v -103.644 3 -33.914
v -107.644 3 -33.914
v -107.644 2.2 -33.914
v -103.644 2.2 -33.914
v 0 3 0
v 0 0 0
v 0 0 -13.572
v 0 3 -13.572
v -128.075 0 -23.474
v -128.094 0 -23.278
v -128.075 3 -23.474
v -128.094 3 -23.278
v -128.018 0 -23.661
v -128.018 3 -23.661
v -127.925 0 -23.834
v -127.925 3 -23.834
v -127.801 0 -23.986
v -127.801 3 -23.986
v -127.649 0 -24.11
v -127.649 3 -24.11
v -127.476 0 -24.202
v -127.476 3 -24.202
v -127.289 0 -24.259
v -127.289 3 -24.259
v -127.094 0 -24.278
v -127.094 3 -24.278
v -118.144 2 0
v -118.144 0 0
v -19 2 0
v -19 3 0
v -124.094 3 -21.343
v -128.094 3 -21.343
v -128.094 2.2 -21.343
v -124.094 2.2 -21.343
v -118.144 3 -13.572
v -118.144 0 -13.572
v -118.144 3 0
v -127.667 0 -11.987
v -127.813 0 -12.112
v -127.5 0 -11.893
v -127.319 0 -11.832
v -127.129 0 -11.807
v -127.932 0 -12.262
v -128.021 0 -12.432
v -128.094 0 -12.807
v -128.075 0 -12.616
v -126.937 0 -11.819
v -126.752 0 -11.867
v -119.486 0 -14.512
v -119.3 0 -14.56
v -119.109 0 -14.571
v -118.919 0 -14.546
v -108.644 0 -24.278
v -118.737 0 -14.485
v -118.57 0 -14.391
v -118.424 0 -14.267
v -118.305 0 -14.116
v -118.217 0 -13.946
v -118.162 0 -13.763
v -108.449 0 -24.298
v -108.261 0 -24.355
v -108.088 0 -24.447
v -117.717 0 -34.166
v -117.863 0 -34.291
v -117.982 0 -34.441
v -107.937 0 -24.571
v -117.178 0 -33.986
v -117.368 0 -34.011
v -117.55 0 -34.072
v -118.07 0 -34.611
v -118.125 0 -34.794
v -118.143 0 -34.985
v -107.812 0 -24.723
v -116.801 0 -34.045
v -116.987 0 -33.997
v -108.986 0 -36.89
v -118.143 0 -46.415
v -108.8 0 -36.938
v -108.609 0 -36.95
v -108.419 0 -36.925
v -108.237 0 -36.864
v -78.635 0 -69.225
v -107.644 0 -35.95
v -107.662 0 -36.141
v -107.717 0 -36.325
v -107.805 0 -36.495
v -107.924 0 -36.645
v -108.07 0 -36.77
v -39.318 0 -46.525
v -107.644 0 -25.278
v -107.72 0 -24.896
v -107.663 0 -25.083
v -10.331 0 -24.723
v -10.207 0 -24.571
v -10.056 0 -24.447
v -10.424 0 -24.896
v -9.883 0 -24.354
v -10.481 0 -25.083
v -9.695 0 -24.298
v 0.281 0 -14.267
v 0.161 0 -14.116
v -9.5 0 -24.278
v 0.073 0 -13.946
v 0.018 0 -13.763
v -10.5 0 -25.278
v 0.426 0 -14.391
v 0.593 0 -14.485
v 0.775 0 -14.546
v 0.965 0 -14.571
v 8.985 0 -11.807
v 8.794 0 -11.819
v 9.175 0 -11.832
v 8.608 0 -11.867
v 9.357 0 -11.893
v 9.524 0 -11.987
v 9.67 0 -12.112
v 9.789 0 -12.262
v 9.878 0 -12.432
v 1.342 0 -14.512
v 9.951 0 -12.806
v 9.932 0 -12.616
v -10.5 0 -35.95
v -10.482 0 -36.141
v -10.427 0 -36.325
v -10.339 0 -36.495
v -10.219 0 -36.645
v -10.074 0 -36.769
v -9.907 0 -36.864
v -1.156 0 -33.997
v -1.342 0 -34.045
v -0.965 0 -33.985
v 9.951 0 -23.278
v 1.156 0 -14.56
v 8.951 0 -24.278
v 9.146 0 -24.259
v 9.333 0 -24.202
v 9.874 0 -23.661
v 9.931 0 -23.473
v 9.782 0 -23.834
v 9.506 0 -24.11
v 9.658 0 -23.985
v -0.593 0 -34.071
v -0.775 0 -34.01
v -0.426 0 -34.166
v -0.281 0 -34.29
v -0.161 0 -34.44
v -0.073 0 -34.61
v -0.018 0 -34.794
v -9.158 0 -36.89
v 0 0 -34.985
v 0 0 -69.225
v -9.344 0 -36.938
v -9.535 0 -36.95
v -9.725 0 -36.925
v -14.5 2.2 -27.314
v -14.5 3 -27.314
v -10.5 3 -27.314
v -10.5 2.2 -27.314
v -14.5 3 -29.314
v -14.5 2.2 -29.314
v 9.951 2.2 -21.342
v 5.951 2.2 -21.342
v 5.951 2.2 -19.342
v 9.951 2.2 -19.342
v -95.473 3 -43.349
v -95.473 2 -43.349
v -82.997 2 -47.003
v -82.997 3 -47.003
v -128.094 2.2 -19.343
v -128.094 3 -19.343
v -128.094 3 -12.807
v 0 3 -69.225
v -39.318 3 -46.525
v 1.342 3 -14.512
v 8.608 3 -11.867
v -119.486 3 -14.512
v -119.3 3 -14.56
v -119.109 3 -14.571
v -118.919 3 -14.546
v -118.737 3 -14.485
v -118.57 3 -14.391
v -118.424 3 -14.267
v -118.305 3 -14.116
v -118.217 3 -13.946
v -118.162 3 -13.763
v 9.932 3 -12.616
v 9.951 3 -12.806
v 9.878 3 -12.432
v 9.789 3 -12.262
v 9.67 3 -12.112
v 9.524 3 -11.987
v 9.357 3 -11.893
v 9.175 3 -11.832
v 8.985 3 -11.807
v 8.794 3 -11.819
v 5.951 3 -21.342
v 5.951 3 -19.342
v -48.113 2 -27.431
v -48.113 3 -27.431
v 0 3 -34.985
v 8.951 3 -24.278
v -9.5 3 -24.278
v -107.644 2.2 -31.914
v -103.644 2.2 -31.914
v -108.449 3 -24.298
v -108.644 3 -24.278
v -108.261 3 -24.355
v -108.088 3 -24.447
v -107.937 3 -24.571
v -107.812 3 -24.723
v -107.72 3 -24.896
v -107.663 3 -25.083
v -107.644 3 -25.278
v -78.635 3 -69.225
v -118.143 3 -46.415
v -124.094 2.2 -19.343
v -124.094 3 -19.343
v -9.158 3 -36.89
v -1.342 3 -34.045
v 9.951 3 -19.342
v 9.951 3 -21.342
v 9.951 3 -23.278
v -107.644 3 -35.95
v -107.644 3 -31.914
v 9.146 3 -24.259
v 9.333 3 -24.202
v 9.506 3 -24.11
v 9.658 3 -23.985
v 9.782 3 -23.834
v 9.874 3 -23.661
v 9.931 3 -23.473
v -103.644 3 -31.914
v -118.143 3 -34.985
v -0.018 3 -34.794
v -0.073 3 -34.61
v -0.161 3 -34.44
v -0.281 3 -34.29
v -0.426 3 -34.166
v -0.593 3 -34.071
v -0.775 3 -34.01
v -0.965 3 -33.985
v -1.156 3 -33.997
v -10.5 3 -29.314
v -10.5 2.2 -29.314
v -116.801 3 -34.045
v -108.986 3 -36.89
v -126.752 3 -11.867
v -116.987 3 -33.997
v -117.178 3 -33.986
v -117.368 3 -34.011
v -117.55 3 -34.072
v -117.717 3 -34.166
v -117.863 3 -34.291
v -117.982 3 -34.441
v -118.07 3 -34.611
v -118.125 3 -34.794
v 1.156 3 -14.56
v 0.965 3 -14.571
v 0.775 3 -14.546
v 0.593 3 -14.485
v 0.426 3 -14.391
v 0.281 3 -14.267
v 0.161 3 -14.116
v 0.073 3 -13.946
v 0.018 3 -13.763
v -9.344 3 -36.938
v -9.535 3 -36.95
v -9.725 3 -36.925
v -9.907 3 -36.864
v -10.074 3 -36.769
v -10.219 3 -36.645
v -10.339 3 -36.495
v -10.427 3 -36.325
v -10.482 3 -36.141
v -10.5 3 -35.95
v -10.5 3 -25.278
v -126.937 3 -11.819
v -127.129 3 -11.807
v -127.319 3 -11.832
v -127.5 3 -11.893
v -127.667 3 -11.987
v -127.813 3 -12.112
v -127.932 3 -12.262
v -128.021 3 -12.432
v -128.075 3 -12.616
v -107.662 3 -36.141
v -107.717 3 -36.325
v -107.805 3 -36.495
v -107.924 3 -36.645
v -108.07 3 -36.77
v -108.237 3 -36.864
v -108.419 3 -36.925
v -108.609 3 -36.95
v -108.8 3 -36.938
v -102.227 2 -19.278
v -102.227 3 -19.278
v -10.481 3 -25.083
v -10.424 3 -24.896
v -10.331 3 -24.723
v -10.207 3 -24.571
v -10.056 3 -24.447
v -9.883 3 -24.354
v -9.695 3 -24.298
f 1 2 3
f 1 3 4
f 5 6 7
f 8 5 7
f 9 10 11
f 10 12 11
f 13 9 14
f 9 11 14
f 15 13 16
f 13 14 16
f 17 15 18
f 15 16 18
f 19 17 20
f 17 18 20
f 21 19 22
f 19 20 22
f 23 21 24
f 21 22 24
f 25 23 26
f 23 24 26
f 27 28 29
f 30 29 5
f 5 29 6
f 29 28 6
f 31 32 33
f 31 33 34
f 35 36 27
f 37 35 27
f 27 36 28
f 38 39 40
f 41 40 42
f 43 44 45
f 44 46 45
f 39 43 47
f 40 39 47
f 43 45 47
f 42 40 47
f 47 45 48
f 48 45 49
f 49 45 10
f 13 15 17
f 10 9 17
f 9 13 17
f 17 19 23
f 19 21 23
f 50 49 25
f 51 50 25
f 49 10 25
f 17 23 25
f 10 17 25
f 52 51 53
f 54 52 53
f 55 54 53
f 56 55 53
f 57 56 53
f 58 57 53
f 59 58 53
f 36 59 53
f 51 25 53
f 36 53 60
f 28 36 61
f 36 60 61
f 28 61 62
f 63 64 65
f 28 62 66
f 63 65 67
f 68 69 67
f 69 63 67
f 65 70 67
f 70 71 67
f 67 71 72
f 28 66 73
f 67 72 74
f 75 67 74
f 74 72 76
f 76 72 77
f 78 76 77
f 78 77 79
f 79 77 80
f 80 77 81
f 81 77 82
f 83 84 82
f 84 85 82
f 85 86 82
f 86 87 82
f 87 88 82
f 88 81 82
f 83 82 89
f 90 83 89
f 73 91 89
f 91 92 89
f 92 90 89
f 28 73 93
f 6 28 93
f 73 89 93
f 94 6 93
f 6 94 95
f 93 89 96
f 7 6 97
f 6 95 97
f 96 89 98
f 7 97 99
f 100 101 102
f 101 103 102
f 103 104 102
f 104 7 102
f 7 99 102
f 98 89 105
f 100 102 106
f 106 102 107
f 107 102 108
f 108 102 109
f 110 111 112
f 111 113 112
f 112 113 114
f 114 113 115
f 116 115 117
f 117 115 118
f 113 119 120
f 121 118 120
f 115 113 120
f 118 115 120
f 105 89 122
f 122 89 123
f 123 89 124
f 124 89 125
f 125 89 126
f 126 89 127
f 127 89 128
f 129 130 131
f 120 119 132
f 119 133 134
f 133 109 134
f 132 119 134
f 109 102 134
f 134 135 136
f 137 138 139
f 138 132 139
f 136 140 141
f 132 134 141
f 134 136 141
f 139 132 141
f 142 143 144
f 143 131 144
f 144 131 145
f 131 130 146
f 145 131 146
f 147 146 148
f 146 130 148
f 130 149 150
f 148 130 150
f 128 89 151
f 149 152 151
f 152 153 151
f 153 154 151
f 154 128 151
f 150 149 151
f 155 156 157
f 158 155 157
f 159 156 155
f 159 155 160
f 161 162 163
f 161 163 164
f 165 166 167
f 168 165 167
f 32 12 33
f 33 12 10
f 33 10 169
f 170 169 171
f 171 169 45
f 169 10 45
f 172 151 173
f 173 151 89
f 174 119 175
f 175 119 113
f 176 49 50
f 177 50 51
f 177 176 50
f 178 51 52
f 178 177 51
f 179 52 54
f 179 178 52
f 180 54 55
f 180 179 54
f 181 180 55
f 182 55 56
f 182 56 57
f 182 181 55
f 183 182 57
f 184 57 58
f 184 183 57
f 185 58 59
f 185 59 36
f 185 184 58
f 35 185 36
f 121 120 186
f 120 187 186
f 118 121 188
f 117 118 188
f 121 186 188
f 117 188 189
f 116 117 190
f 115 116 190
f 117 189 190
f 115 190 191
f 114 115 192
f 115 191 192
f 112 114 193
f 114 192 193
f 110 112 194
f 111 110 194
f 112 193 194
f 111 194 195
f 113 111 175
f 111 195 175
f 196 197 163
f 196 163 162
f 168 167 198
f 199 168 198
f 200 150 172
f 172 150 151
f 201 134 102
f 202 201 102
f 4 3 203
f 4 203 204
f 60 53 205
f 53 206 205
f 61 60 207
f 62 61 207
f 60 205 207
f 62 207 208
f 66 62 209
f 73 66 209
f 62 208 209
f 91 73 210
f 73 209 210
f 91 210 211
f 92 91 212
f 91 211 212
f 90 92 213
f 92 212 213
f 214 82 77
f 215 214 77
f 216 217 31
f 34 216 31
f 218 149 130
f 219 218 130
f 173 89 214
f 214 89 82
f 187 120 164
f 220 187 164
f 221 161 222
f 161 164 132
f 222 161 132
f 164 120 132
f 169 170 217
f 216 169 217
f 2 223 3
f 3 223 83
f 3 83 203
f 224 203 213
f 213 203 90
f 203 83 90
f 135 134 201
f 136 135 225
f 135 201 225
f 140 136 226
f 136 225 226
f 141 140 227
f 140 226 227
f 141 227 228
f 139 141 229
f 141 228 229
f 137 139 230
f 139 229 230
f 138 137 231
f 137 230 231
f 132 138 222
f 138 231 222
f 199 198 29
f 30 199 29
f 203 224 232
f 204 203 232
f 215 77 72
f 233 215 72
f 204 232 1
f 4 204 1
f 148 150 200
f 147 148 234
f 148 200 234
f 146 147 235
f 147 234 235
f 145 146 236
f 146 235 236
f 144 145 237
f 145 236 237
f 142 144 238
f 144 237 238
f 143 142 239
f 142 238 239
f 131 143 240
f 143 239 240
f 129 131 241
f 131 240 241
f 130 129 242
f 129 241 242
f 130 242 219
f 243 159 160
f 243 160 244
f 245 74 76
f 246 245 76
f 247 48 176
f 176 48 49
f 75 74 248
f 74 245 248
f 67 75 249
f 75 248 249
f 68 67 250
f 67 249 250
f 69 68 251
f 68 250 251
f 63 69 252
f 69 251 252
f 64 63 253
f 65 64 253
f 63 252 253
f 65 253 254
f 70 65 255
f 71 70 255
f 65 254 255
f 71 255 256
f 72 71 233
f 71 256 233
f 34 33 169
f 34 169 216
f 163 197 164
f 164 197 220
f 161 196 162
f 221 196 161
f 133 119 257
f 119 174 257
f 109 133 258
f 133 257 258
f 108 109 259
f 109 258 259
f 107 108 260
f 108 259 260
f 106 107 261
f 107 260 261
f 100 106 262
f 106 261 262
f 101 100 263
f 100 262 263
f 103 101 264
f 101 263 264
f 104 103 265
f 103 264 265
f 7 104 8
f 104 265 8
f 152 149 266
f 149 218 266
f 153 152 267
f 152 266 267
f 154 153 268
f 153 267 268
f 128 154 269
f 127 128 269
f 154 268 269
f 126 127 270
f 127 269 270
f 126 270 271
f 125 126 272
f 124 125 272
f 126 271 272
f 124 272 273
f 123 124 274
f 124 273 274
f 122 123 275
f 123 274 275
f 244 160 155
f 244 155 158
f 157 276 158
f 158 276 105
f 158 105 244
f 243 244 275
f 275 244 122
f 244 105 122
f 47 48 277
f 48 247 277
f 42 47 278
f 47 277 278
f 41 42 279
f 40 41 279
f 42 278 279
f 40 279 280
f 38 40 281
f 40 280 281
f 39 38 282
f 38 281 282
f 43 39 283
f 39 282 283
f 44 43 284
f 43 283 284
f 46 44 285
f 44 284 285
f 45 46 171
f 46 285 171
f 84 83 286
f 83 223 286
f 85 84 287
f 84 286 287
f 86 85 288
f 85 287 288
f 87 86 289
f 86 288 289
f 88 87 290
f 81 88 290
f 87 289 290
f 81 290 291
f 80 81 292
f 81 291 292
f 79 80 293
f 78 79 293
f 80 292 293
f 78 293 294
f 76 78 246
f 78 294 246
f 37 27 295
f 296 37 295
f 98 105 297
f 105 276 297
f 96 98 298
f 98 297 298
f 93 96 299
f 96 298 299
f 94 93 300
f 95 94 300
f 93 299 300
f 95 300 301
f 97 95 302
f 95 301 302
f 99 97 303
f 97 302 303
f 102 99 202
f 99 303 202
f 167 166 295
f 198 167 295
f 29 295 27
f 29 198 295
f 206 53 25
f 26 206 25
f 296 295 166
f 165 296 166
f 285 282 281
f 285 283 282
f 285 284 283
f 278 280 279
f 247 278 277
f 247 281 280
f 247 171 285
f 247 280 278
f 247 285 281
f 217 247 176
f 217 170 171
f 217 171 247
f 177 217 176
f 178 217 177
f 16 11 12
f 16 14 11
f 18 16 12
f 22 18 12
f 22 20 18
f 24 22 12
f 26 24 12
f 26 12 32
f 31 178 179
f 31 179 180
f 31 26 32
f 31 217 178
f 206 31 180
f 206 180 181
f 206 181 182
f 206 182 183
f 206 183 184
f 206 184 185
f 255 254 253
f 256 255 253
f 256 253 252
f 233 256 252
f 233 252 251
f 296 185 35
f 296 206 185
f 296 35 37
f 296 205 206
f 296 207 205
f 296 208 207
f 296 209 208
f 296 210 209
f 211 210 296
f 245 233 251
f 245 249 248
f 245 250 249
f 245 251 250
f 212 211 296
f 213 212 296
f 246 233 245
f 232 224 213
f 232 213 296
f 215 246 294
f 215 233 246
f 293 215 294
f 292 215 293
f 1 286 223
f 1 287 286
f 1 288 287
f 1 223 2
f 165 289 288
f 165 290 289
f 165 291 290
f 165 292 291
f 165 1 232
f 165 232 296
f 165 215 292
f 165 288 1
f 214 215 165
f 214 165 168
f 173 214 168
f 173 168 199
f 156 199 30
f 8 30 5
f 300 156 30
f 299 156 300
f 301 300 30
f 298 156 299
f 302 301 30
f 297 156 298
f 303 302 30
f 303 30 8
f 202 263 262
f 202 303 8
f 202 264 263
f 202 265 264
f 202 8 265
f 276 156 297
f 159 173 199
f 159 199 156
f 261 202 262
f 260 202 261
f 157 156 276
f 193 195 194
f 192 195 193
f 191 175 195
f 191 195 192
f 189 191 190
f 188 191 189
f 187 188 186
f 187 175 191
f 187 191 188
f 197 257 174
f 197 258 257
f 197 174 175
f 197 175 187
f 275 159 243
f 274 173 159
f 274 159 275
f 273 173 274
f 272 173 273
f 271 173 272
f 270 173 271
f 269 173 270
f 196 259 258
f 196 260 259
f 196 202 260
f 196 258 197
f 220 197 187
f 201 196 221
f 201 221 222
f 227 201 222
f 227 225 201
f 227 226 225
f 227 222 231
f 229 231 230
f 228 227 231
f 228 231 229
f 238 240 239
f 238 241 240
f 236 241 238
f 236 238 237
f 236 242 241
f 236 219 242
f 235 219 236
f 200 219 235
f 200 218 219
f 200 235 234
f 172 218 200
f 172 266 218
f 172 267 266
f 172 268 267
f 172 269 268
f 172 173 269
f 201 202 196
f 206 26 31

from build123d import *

# Parameters (mm, degrees)
P_IDAT_VYSUNUT_M1_DEPTH  = 3
P_IDAT_VYSUNUT_M2_DEPTH  = 2
ZAOBLIT3_R               = 1
SKICA2_W                 = 4
SKICA2_H                 = 2
ODEBRAT_VYSUNUT_M1_DEPTH = 0.8
SKICA3_W                 = 4
SKICA3_H                 = 2
ODEBRAT_VYSUNUT_M2_DEPTH = 0.8


with BuildPart() as part:
    # Skica1 → P_idat vysunut_m1 (new body)
    with BuildSketch(Plane(origin=(0, 0, 0), x_dir=(1, 0, 0), z_dir=(0, 1, 0))):
        Polygon((-118.143750166, 15), (-118.143750166, 0), (-102.227105248, 19.278496169), (-95.473037065, 43.348863075), (-82.997228437, 47.003202833), (-48.112980408, 27.430537213), (-19, 0), (0, 0), (0, 15), (9.950504516, 11.37831254), (9.950504516, 24.27831254), (-10.5, 24.27831254), (-10.5, 37.37831254), (0, 33.55662508), (0, 69.224902673), (-39.317553332, 46.524902673), (-78.635106664, 69.224902673), (-118.143185584, 46.414902673), (-118.143185584, 33.5570142), (-107.643750166, 37.378496169), (-107.643750166, 24.278496169), (-128.093750166, 24.278496169), (-128.093750166, 11.378496169), align=None)
    extrude(amount=P_IDAT_VYSUNUT_M1_DEPTH)

    # Skica1_3 → P_idat vysunut_m2 (add)
    with BuildSketch(Plane(origin=(0, 0, 0), x_dir=(1, 0, 0), z_dir=(0, 1, 0))):
        Polygon((-102.227105248, 19.278496169), (-118.143750166, 0), (-19, 0), (-48.112980408, 27.430537213), (-82.997228437, 47.003202833), (-95.473037065, 43.348863075), align=None)
    extrude(amount=P_IDAT_VYSUNUT_M2_DEPTH)

    # Zaoblit3
    zaoblit3_edges = [part.edges().sort_by_distance(p)[0] for p in [
        (-10.5, 1.5, -24.27831254),
        (9.950504516, 1.5, -24.27831254),
        (9.950504516, 1.5, -11.37831254),
        (0, 1.5, -15),
        (-118.143750166, 1.5, -15),
        (-128.093750166, 1.5, -11.378496169),
        (-128.093750166, 1.5, -24.278496169),
        (-107.643750166, 1.5, -24.278496169),
        (-107.643750166, 1.5, -37.378496169),
        (-118.143185584, 1.5, -33.5570142),
        (0, 1.5, -33.55662508),
        (-10.5, 1.5, -37.37831254),
    ]]
    fillet(zaoblit3_edges, radius=ZAOBLIT3_R)

    # Skica2 → Odebrat vysunut_m1 (cut)
    with BuildSketch(Plane(origin=(0, 3, 0), x_dir=(1, 0, 0), z_dir=(0, 1, 0))):
        with Locations((-105.643750166, 32.914422166)):
            Rectangle(SKICA2_W, SKICA2_H)
        with Locations((-126.093750166, 20.342570172)):
            Rectangle(SKICA2_W, SKICA2_H)
    extrude(amount=-ODEBRAT_VYSUNUT_M1_DEPTH, mode=Mode.SUBTRACT)

    # Skica3 → Odebrat vysunut_m2 (cut)
    with BuildSketch(Plane(origin=(0, 3, 0), x_dir=(1, 0, 0), z_dir=(0, 1, 0))):
        with Locations((-12.5, 28.314238537)):
            Rectangle(SKICA3_W, SKICA3_H)
        with Locations((7.950504516, 20.342386544)):
            Rectangle(SKICA3_W, SKICA3_H)
    extrude(amount=-ODEBRAT_VYSUNUT_M2_DEPTH, mode=Mode.SUBTRACT)


solid = part.part
